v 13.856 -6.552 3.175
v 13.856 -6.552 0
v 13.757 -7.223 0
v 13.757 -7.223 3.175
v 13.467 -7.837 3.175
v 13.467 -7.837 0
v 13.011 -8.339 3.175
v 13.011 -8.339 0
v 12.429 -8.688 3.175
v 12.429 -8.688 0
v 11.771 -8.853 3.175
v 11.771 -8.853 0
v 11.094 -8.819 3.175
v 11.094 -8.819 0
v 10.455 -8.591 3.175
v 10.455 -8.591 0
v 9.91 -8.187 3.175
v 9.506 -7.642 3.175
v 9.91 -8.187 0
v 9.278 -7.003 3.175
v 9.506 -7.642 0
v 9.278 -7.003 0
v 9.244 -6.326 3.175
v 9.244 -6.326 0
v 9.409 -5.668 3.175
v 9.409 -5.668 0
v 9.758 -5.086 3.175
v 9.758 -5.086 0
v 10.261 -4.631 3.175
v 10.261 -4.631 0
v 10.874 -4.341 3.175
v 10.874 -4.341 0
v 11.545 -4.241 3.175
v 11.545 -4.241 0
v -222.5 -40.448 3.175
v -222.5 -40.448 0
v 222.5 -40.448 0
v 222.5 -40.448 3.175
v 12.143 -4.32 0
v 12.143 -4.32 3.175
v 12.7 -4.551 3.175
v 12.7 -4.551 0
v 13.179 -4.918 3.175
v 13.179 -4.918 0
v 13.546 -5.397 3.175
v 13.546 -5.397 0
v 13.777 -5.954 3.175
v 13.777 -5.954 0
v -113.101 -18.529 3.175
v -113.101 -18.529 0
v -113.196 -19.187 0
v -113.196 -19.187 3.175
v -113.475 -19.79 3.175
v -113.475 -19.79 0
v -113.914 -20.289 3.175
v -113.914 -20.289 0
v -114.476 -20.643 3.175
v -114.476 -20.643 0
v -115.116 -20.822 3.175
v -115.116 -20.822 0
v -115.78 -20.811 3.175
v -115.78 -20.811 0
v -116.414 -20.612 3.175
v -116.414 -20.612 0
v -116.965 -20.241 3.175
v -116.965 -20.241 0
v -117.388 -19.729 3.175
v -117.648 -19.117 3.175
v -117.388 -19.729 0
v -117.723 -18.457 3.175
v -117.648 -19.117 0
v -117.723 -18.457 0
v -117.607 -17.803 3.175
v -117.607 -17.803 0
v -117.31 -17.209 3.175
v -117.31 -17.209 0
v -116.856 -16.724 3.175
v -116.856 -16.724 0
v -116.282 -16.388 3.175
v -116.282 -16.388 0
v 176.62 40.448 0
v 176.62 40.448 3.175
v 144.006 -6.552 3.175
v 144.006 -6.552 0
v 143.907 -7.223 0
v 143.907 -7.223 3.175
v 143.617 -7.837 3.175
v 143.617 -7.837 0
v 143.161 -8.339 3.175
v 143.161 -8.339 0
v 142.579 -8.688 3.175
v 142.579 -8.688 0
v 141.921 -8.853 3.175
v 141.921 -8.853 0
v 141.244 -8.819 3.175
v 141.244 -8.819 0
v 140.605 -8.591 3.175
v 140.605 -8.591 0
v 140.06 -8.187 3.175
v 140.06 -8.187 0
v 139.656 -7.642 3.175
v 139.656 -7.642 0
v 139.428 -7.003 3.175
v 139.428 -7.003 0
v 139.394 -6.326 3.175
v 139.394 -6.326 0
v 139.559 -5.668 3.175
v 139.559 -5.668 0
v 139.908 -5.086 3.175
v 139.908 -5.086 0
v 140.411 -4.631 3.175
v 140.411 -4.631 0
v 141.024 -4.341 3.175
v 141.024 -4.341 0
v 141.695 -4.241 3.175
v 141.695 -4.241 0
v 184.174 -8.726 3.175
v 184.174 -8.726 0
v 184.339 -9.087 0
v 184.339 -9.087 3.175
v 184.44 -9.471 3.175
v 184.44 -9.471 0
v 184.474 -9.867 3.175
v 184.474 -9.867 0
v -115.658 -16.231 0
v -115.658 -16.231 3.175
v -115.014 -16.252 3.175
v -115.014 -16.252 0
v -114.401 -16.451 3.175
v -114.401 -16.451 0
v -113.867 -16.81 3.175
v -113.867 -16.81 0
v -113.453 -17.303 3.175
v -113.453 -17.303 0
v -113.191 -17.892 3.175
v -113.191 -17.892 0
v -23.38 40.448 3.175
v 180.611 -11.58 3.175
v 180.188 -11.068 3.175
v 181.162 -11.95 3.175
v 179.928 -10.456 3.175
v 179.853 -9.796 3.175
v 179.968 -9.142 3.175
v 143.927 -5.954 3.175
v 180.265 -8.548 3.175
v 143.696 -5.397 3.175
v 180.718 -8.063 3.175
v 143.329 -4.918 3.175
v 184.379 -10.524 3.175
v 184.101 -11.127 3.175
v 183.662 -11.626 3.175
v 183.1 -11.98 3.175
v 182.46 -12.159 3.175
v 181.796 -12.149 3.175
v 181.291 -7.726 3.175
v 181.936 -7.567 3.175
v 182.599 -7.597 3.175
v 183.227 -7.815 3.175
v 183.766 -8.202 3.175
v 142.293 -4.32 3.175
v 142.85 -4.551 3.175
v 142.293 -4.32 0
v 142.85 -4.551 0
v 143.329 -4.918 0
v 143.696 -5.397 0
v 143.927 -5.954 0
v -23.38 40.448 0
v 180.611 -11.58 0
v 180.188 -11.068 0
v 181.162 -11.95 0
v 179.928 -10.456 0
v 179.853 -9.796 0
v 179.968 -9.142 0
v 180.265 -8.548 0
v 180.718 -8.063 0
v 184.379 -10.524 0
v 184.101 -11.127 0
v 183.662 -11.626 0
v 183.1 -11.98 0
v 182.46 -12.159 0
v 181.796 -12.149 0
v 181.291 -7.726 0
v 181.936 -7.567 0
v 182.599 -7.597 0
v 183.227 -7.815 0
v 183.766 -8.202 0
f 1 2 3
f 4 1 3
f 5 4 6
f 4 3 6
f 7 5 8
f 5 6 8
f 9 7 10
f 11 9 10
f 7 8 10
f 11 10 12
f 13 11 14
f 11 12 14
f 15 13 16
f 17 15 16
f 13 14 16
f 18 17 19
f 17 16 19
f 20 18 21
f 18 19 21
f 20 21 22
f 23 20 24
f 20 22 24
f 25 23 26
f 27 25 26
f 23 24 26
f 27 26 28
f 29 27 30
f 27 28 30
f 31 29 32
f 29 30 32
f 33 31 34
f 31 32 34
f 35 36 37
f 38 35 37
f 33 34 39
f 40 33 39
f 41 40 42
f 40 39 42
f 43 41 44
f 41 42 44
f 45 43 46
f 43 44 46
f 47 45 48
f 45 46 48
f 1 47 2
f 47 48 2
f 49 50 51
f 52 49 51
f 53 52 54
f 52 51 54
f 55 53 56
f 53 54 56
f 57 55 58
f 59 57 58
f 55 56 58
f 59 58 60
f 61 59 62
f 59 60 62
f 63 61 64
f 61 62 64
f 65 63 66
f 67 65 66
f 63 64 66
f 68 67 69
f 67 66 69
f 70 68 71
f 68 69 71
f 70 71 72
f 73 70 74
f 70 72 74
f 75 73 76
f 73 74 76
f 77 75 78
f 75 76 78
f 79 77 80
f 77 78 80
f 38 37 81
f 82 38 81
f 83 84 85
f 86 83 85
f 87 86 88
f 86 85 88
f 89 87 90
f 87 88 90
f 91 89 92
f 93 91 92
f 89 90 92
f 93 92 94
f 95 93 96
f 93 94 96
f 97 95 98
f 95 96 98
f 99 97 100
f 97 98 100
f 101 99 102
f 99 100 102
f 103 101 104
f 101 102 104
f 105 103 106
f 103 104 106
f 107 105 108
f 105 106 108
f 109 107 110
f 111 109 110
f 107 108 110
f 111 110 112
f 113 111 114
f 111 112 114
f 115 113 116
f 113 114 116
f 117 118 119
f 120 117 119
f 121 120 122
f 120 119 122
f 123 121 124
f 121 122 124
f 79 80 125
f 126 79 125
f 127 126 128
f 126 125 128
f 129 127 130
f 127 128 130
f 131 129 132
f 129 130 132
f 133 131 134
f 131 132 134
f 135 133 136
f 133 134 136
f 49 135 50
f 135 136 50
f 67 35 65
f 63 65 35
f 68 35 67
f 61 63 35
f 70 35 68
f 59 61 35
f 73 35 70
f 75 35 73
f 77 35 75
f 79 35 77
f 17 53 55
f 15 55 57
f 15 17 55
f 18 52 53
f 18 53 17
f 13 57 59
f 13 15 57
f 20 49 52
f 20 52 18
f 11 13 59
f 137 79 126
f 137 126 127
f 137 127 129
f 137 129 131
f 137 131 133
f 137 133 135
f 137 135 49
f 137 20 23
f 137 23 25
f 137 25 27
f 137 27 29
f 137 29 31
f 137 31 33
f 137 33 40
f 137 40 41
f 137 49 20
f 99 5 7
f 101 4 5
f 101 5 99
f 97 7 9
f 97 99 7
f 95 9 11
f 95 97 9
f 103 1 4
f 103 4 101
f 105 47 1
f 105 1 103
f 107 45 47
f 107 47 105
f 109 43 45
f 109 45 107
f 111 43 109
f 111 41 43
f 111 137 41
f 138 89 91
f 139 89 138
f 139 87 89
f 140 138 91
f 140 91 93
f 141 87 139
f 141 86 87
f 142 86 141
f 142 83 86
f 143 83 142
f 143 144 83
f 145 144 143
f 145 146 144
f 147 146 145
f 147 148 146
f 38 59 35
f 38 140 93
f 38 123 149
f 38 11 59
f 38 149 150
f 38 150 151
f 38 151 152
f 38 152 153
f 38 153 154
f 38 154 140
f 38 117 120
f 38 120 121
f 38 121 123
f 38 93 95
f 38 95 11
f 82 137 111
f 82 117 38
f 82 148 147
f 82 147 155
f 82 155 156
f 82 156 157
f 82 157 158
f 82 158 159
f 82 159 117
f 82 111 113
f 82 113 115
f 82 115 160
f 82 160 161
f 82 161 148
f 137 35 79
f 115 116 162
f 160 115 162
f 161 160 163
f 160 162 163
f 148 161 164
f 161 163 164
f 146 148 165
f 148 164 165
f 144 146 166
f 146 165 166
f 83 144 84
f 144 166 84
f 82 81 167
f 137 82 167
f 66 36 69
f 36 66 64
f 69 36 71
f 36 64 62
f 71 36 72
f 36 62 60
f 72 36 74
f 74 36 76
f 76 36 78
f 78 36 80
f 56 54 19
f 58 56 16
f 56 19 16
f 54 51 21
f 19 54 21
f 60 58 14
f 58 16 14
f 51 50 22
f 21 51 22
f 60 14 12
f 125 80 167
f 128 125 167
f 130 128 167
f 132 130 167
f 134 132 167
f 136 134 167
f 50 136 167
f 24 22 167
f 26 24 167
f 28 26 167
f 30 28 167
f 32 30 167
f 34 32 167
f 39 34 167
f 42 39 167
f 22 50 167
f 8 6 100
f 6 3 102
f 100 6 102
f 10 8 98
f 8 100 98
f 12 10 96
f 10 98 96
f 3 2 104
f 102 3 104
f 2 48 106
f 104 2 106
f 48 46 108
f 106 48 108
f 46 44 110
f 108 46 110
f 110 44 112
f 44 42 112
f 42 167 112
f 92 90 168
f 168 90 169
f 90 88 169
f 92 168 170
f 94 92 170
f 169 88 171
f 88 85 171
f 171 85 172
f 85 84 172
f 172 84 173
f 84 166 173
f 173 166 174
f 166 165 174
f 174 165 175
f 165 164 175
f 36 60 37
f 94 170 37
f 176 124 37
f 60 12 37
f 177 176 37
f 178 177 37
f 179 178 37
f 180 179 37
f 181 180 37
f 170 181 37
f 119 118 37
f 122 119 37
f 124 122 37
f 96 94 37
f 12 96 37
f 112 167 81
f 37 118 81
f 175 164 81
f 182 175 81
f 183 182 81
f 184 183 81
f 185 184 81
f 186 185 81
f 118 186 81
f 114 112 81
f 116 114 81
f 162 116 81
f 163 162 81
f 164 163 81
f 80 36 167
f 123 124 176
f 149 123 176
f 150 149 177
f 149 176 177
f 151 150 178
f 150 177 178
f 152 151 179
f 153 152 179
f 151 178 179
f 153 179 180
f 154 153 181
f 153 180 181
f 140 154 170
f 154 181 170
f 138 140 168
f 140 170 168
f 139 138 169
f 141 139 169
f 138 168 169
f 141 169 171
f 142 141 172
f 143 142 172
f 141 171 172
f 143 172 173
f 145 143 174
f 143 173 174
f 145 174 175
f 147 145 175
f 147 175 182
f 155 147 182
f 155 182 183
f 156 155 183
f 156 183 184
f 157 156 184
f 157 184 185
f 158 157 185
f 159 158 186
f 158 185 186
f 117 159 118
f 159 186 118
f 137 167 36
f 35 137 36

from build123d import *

# Parameters (mm, degrees)
F1_DEPTH = 3.175


with BuildPart() as f1:
    # F0 (on Top) → F1 (new body)
    with BuildSketch(Plane.XY):
        Polygon((-222.5, -40.4475), (222.5, -40.4475), (176.6197321826, 40.4475), (141.6947321826, 40.4475), (11.5447321826, 40.4475), (-23.3802678174, 40.4475), align=None)
        with BuildLine():
            ThreePointArc((-116.282366584, -16.3878218263), (-114.1217077206, -16.6117685547), (-113.1009845959, -18.5292468893))
            ThreePointArc((-113.1009845959, -18.5292468893), (-116.7030614712, -20.4467252239), (-116.282366584, -16.3878218263))
        make_face(mode=Mode.SUBTRACT)
        with BuildLine():
            ThreePointArc((11.5447321826, -4.2411), (13.1791387966, -4.918093386), (13.8561321826, -6.5525))
            ThreePointArc((13.8561321826, -6.5525), (9.9103255685, -8.186906614), (11.5447321826, -4.2411))
        make_face(mode=Mode.SUBTRACT)
        with BuildLine():
            ThreePointArc((141.6947321826, -4.2411), (143.3291387966, -4.918093386), (144.0061321826, -6.5525))
            ThreePointArc((144.0061321826, -6.5525), (140.0603255685, -8.186906614), (141.6947321826, -4.2411))
        make_face(mode=Mode.SUBTRACT)
        with BuildLine():
            ThreePointArc((184.1736370913, -8.7264269389), (184.3980129389, -9.2770651231), (184.4744918977, -9.8667242618))
            ThreePointArc((184.4744918977, -9.8667242618), (179.9281708566, -10.4563834005), (184.1736370913, -8.7264269389))
        make_face(mode=Mode.SUBTRACT)
    extrude(amount=F1_DEPTH)


solid = f1.part
